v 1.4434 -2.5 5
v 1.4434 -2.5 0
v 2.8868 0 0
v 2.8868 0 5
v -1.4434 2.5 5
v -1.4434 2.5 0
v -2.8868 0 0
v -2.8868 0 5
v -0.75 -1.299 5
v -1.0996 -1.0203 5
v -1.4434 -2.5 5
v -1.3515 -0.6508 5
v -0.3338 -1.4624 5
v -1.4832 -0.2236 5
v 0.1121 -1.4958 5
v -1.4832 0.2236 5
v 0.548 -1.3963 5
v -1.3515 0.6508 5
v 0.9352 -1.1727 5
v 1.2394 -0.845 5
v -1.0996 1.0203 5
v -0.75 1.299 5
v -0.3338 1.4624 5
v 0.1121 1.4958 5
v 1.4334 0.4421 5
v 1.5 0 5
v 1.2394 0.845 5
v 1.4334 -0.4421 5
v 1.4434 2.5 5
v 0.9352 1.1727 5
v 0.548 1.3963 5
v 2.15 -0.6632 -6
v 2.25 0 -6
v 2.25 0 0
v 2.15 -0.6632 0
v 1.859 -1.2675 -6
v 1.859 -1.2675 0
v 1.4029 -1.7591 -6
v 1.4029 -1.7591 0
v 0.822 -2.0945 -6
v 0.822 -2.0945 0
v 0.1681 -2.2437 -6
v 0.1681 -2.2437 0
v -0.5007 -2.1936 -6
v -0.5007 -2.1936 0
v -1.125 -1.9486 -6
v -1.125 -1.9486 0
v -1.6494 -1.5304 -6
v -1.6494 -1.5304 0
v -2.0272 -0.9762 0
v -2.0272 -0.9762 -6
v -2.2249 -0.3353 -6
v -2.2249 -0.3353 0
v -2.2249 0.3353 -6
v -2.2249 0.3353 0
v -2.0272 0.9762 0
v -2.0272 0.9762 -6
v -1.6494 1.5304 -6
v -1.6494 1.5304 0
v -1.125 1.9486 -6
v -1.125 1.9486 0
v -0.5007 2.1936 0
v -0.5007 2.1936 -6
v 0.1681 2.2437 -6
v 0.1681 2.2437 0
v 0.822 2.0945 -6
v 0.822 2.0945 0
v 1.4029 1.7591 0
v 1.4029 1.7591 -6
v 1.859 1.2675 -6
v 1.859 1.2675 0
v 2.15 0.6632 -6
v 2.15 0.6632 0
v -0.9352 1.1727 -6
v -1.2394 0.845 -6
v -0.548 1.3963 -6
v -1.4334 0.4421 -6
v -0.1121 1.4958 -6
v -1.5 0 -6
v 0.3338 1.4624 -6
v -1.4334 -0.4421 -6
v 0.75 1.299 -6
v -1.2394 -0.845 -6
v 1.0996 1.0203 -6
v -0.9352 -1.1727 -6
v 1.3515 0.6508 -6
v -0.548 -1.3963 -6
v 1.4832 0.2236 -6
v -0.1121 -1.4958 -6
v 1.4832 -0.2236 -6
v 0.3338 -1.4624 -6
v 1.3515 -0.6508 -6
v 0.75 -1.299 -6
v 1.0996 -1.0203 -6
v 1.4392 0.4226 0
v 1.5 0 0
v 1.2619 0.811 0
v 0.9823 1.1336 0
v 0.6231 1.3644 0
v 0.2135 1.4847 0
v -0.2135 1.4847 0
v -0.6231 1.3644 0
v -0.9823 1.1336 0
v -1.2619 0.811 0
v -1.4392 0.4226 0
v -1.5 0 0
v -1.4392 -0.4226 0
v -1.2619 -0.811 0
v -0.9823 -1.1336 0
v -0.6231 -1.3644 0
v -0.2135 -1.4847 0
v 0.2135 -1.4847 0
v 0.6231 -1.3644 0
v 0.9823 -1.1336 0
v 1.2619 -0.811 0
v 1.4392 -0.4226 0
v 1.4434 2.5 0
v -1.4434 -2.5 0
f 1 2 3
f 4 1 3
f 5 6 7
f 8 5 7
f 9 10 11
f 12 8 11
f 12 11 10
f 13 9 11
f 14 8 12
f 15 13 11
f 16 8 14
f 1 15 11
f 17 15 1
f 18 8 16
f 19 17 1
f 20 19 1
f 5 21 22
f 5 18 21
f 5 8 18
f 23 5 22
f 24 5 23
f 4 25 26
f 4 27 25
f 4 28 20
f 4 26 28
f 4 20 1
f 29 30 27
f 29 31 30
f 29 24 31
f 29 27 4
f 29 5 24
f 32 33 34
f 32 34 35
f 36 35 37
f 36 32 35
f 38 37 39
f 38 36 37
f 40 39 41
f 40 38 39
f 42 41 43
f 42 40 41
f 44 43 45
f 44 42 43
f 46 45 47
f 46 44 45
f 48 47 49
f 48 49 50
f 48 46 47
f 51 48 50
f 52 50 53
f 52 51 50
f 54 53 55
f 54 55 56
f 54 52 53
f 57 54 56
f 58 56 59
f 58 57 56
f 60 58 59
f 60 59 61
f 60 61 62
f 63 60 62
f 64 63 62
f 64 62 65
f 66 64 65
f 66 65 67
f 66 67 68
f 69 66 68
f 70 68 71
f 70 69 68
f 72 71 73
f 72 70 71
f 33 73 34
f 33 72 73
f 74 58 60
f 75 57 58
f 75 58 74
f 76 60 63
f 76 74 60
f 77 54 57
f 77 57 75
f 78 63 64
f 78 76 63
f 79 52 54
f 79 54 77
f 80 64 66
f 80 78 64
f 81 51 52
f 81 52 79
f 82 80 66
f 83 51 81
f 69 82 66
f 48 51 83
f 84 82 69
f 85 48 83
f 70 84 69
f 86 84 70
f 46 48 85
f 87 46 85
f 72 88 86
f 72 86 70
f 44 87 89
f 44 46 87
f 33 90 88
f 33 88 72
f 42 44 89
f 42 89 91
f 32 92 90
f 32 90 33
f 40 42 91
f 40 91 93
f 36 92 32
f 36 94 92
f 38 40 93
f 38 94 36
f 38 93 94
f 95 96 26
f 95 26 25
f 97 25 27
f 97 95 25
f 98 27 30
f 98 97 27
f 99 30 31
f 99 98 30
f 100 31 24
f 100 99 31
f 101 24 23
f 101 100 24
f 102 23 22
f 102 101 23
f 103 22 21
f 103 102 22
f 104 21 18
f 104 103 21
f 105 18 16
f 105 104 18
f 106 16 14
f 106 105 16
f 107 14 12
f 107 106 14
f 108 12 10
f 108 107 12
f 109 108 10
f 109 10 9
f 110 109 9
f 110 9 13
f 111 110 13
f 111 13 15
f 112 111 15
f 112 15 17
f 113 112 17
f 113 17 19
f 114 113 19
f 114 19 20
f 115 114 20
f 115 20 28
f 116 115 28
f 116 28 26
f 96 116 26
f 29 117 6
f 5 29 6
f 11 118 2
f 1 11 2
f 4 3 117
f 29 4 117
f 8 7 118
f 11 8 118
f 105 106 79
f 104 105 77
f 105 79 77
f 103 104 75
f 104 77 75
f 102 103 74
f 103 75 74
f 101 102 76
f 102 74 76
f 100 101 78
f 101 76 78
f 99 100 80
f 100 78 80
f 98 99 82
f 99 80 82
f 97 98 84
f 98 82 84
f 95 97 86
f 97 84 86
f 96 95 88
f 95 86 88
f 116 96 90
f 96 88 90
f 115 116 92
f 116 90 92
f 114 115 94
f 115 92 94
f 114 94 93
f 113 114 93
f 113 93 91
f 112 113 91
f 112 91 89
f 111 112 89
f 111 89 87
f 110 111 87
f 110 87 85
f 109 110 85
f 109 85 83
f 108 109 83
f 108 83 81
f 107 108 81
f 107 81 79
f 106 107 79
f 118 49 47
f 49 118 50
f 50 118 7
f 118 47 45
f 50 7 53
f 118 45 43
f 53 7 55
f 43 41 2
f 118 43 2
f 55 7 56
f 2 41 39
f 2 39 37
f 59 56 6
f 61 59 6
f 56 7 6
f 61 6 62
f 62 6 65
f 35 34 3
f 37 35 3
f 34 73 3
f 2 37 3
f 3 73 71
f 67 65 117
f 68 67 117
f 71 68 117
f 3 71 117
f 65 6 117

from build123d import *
from build123d.topology import SkipClean

# Parameters (mm, degrees)
ESQUISSE1_R        = 1.5
BOSS_EXTRU_1_DEPTH = 5
BOSS_EXTRU_2_START = 6
ESQUISSE2_R        = 2.25
ESQUISSE2_R_2      = 1.5
BOSS_EXTRU_2_DEPTH = 6


with BuildPart() as part:
    # Esquisse1 → Boss.-Extru.1 (new body)
    with BuildSketch(Plane.XY):
        Polygon((-2.886751346, 0), (-1.443375673, -2.5), (1.443375673, -2.5), (2.886751346, 0), (1.443375673, 2.5), (-1.443375673, 2.5), align=None)
        Circle(ESQUISSE1_R, mode=Mode.SUBTRACT)
    extrude(amount=BOSS_EXTRU_1_DEPTH)

    # Esquisse2 → Boss.-Extru.2 (add)
    with SkipClean():  # the faces are left unmerged after this step: merging them gives an invalid solid
        with BuildSketch(Plane(origin=(0, 0, 0), x_dir=(-1, 0, 0), z_dir=(0, 0, -1)).offset(BOSS_EXTRU_2_START)):
            with Locations(Location((0, 0, 0), (0, 0, 180))):
                Circle(ESQUISSE2_R)
            Circle(ESQUISSE2_R_2, mode=Mode.SUBTRACT)
        extrude(amount=-BOSS_EXTRU_2_DEPTH)


solid = part.part
